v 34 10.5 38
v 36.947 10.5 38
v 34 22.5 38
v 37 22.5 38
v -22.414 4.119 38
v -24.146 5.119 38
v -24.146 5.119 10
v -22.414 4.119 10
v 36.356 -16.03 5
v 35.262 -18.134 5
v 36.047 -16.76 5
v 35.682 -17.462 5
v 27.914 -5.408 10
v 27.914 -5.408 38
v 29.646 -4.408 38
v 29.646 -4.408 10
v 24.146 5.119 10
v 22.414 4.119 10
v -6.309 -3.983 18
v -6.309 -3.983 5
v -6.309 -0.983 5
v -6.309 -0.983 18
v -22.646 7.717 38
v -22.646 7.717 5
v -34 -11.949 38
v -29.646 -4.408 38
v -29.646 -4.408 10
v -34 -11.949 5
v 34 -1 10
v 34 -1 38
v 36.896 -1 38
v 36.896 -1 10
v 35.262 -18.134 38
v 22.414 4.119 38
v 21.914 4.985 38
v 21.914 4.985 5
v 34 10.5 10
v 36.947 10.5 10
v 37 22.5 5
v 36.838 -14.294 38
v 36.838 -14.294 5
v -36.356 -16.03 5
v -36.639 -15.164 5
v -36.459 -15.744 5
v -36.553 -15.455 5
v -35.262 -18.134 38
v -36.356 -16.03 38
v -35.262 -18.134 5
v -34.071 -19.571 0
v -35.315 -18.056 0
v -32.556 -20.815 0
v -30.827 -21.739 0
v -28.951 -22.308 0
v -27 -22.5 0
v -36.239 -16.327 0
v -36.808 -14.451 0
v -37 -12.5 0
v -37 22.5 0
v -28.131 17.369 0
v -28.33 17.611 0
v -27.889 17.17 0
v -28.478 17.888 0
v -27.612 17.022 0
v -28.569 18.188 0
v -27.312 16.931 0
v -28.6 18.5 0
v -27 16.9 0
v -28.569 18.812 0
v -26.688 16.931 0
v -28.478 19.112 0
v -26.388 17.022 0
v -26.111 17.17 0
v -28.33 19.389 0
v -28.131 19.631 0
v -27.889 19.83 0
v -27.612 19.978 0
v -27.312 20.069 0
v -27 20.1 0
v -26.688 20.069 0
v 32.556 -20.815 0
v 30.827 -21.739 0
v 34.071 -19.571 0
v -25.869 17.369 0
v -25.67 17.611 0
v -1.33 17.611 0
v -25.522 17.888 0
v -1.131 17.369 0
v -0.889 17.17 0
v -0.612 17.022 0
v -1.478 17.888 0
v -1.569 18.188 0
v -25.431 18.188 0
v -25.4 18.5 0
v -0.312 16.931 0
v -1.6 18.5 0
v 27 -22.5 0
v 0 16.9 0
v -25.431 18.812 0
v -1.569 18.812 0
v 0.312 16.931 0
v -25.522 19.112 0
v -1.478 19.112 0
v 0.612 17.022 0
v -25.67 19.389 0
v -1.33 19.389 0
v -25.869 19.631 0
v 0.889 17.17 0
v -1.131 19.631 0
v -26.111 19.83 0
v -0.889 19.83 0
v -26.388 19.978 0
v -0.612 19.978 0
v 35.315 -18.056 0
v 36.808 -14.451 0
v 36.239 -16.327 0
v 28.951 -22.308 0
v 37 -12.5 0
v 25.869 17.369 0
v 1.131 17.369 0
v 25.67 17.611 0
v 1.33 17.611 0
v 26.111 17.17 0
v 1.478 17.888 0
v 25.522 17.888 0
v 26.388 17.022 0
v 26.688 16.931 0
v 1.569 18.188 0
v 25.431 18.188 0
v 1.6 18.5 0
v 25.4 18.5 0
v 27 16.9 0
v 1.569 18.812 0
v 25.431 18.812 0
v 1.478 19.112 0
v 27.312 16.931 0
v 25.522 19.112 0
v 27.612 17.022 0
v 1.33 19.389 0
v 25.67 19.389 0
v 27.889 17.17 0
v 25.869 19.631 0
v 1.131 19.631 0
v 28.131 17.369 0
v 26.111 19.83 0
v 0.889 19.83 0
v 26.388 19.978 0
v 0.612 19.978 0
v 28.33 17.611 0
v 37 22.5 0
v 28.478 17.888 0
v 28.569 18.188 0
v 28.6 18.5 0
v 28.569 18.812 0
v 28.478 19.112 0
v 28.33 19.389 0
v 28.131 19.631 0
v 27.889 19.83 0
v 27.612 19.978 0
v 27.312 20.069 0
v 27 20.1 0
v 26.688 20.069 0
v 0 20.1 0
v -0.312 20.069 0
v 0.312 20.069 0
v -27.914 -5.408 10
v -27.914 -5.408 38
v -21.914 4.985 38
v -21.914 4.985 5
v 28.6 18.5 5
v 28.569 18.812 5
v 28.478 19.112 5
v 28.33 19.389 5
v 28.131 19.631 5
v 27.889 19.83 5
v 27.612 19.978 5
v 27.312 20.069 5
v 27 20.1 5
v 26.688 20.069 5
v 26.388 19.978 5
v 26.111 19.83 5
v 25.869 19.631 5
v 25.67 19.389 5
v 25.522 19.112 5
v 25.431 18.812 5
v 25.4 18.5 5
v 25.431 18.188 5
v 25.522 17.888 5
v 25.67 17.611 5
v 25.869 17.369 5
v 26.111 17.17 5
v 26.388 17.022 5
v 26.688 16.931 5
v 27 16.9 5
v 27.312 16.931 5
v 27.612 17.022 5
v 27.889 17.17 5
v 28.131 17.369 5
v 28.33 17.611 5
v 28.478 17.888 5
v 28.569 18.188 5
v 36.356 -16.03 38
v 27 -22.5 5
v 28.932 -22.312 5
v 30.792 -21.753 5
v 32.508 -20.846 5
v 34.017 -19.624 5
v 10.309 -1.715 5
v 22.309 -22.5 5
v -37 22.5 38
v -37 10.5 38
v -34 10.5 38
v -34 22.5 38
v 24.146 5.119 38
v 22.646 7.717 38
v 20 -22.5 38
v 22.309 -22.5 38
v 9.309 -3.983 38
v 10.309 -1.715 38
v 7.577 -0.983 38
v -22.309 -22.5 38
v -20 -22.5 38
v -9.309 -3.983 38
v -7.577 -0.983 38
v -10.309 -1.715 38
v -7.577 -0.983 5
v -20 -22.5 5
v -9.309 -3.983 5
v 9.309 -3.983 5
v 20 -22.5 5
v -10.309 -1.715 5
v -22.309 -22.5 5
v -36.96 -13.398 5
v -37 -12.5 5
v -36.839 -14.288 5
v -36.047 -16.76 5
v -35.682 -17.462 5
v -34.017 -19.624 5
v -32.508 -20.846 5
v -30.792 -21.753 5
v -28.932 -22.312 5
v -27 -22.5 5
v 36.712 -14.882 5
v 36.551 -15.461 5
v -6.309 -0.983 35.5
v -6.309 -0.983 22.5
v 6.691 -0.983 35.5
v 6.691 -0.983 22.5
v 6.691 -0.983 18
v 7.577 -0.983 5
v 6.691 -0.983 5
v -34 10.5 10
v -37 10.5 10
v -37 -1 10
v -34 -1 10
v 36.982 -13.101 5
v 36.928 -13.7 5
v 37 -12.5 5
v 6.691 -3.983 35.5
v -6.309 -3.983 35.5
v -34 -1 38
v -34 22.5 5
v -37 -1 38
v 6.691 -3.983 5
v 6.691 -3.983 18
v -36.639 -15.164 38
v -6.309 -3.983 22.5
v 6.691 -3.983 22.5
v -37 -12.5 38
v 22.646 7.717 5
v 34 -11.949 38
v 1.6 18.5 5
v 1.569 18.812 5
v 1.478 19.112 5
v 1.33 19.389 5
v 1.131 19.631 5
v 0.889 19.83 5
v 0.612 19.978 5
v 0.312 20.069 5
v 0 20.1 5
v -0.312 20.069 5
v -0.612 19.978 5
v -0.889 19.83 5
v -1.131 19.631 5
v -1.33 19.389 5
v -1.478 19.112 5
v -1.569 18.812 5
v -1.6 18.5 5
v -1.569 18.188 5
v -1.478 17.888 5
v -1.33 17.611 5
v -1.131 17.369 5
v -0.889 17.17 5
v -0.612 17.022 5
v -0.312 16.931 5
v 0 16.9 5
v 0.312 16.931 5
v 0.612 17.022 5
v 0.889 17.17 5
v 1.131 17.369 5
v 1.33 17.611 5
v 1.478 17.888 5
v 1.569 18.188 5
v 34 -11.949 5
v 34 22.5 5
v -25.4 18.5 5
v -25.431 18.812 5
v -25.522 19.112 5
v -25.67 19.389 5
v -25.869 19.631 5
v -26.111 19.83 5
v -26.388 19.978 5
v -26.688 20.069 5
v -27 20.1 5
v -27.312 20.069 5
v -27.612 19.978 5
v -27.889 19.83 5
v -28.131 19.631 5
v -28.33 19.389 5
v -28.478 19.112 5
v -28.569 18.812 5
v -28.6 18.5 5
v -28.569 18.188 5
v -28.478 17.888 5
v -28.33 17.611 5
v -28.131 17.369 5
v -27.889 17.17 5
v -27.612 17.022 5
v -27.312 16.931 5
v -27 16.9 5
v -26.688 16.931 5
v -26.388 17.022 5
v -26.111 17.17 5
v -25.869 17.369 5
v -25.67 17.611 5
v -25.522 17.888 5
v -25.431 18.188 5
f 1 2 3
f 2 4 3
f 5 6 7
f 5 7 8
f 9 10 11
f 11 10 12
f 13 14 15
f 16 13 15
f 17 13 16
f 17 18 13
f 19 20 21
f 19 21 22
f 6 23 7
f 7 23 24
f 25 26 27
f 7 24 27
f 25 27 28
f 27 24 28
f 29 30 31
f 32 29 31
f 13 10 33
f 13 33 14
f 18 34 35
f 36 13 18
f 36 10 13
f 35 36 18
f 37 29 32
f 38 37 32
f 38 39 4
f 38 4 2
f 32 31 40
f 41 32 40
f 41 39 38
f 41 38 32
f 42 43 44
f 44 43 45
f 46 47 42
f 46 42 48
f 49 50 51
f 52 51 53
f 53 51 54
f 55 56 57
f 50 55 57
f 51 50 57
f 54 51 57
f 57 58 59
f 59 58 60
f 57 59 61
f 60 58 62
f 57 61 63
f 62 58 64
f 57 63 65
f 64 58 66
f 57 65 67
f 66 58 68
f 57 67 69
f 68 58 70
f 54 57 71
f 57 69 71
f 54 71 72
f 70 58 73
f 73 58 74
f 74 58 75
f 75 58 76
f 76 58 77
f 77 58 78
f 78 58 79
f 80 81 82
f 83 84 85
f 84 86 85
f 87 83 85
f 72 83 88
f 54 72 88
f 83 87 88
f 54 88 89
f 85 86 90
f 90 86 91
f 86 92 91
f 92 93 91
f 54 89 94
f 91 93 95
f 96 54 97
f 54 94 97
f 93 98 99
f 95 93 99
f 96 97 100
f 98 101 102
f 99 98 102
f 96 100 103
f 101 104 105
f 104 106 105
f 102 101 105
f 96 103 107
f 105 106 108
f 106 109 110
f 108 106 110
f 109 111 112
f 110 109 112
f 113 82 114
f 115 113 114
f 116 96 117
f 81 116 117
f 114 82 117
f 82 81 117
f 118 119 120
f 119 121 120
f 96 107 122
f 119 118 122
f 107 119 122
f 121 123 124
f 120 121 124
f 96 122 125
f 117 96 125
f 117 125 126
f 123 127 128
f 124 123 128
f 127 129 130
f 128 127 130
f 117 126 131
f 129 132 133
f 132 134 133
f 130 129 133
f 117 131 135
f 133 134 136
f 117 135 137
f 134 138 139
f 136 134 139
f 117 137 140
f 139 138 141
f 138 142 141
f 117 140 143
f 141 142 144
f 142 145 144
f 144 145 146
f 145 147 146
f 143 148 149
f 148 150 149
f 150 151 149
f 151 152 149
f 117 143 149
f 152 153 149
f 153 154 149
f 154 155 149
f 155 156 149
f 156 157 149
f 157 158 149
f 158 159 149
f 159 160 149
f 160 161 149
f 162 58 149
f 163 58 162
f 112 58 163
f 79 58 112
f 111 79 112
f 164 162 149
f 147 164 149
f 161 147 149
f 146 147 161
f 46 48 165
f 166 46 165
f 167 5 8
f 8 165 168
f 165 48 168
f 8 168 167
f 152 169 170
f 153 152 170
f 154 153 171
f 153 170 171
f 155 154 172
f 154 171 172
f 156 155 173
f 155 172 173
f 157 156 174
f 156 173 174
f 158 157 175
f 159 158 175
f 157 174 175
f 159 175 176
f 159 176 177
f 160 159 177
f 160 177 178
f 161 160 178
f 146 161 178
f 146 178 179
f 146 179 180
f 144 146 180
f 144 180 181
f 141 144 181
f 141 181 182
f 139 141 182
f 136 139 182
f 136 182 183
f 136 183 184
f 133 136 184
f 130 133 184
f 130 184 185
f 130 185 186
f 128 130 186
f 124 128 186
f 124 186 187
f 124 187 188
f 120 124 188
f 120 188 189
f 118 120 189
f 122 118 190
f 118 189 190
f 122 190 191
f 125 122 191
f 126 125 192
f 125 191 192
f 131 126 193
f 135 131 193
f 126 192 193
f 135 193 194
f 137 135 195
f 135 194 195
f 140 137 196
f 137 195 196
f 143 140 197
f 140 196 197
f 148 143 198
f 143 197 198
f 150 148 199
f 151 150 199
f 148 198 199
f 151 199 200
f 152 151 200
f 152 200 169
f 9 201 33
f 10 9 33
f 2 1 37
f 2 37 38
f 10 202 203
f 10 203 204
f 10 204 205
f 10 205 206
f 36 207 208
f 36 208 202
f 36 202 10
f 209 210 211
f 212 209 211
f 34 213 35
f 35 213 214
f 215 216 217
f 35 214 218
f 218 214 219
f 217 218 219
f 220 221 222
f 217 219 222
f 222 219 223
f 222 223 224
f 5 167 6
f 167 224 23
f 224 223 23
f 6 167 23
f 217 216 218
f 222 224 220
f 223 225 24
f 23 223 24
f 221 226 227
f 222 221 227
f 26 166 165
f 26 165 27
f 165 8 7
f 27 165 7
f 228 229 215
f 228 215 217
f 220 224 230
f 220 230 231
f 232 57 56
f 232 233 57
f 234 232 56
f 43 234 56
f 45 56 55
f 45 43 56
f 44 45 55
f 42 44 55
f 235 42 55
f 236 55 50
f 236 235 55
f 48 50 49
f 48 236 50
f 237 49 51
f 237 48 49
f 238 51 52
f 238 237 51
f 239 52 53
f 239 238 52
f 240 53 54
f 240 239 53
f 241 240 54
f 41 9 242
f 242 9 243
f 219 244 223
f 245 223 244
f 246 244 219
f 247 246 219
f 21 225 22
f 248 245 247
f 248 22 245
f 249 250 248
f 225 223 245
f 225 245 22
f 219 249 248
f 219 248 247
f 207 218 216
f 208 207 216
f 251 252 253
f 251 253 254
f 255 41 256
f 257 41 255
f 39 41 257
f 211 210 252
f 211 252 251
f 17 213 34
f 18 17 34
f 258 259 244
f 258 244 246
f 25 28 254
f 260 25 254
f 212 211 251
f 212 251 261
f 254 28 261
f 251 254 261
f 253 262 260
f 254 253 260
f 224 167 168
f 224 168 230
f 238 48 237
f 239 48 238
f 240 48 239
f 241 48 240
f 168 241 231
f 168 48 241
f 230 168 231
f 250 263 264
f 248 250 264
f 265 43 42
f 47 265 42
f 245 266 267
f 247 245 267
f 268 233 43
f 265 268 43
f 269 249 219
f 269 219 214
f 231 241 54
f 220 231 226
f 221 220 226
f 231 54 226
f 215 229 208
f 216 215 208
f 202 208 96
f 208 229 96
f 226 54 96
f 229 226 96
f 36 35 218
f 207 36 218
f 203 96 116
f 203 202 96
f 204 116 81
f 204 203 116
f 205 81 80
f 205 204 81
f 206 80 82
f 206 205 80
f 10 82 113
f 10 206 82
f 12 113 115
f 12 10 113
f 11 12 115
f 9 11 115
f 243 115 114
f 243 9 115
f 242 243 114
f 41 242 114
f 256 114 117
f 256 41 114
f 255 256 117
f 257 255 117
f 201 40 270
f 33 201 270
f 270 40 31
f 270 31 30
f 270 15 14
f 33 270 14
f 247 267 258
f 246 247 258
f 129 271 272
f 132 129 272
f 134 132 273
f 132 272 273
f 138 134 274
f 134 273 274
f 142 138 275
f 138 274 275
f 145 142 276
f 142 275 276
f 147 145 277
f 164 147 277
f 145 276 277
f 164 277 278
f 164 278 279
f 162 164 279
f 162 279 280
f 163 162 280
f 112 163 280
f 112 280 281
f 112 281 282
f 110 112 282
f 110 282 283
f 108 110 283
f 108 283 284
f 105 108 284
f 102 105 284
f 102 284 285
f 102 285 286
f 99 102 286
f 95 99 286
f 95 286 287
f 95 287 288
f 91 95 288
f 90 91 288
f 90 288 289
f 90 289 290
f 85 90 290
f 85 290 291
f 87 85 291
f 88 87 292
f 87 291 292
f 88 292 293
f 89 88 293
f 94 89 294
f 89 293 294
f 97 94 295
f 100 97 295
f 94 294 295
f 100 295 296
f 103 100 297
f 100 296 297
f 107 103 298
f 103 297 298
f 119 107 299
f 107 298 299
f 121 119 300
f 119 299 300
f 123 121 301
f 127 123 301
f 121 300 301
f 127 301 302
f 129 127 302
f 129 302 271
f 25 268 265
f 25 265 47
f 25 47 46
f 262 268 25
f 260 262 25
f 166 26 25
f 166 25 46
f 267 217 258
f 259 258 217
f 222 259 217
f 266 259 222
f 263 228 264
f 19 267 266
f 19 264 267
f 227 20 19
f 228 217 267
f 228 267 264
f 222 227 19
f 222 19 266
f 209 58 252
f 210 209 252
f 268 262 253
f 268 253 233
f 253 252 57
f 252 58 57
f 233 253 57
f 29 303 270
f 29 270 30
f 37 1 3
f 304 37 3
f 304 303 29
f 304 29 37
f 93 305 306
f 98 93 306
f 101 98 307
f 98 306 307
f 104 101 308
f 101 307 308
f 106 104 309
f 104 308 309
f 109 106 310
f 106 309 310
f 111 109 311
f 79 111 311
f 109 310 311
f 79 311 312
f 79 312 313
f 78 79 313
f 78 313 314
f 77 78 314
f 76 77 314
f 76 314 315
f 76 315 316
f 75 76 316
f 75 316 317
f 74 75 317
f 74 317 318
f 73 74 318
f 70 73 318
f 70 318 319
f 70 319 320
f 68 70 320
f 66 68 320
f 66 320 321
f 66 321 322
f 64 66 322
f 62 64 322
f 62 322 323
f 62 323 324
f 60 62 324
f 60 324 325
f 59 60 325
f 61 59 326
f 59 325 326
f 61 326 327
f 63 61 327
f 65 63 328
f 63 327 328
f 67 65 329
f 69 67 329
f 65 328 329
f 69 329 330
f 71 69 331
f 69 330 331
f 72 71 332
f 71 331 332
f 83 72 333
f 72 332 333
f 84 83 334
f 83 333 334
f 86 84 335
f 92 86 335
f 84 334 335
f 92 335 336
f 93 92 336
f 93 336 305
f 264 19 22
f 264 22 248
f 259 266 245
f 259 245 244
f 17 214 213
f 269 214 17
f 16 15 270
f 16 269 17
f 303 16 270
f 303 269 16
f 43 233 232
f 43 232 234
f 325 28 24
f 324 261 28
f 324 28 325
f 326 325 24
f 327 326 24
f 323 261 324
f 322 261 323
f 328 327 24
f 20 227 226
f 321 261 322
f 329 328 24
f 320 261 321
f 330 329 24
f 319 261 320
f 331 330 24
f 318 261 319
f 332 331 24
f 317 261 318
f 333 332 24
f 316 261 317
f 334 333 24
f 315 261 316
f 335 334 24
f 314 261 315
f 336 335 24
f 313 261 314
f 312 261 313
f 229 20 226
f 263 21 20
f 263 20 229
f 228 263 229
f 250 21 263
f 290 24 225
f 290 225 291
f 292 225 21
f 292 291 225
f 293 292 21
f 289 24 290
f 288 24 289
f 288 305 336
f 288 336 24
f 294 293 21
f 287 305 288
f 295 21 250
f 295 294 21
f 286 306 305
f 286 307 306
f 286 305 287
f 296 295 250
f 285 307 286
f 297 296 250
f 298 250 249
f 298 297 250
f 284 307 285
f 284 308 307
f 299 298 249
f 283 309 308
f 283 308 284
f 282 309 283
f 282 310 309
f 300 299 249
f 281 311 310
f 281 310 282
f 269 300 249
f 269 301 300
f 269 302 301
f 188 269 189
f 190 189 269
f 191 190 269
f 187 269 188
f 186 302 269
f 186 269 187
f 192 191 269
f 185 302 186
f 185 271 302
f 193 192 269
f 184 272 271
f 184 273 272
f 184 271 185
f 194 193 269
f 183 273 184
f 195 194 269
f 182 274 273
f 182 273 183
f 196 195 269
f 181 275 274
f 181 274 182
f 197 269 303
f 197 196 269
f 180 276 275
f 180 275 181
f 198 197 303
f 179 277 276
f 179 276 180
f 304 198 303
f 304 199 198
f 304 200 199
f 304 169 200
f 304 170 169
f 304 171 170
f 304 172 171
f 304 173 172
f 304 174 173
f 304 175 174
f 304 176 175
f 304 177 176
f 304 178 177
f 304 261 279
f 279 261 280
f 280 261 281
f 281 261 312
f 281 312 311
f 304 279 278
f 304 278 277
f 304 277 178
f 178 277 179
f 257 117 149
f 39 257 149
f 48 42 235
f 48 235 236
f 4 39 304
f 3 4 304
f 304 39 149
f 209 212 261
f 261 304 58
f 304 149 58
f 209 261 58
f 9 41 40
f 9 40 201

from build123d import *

# Parameters (mm, degrees)
SKETCH_1_W          = 74
SKETCH_1_H          = 45
EXTRUDE_1_DEPTH     = 5
FILLET_1_R          = 10
FILLET_2_R          = 10
EXTRUDE_3_DEPTH     = 33
EXTRUDE_4_DEPTH     = 33
SKETCH_6_W          = 13
SKETCH_6_H          = 13
CUT_EXTRUDE_1_DEPTH = 60.282099079
CUT_EXTRUDE_3_DEPTH = 28
EXTRUDE_5_DEPTH     = 33
SKETCH_10_W         = 3
SKETCH_10_H         = 11.5
CUT_EXTRUDE_4_DEPTH = 28
SKETCH_11_R         = 1.6
CUT_EXTRUDE_5_DEPTH = 10


with BuildPart() as part:
    # 草图1 → 凸台-拉伸1 (new body)
    with BuildSketch(Plane.XY):
        Rectangle(SKETCH_1_W, SKETCH_1_H)
    extrude(amount=EXTRUDE_1_DEPTH)

    # 圆角1
    fillet_1_edges = [part.edges().sort_by_distance(p)[0] for p in [
        (-37, -22.5, 2.5),
    ]]
    fillet(fillet_1_edges, radius=FILLET_1_R)

    # 圆角2
    fillet_2_edges = [part.edges().sort_by_distance(p)[0] for p in [
        (37, -22.5, 2.5),
    ]]
    fillet(fillet_2_edges, radius=FILLET_2_R)

    # 草图4 → 凸台-拉伸3 (add)
    with BuildSketch(Plane.XY.offset(5)):
        Polygon((-35.261752955, -18.134131531), (-21.914141487, 4.984609691), (-10.309401077, -1.715390309), (-22.309401077, -22.5), (-20, -22.5), (-7.577350269, -0.983339502), (-22.646192295, 7.716660498), (-36.356272702, -16.029895342), align=None)
        Polygon((36.356272702, -16.029895342), (35.261752955, -18.134131531), (21.914141487, 4.984609691), (10.309401077, -1.715390309), (22.309401077, -22.5), (20, -22.5), (7.577350269, -0.983339502), (22.646192295, 7.716660498), align=None)
    extrude(amount=EXTRUDE_3_DEPTH)

    # 草图5 → 凸台-拉伸4 (add)
    with BuildSketch(Plane.XY.offset(5)):
        Polygon((-7.577350269, -0.983339502), (7.577350269, -0.983339502), (9.309401077, -3.983339502), (-9.309401077, -3.983339502), align=None)
    extrude(amount=EXTRUDE_4_DEPTH)

    # 草图6 → 切除-拉伸1 (cut, through all)
    with BuildSketch(Plane.XZ.offset(3.983339502)):
        with Locations((0.190598923, 29)):
            Rectangle(SKETCH_6_W, SKETCH_6_H)
        with Locations((0.190598923, 11.5)):
            Rectangle(SKETCH_6_W, SKETCH_6_H)
    extrude(amount=-CUT_EXTRUDE_1_DEPTH, mode=Mode.SUBTRACT)

    # 草图8 → 切除-拉伸3 (cut)
    with BuildSketch(Plane.XY.offset(38)):
        Polygon((-29.646192295, -4.407695155), (-24.146192295, 5.118584287), (-22.414141487, 4.118584287), (-27.914141487, -5.407695155), align=None)
        Polygon((27.914141487, -5.407695155), (29.646192295, -4.407695155), (24.146192295, 5.118584287), (22.414141487, 4.118584287), align=None)
    extrude(amount=-CUT_EXTRUDE_3_DEPTH, mode=Mode.SUBTRACT)

    # 草图9 → 凸台-拉伸5 (add)
    with BuildSketch(Plane.XY.offset(5)):
        Polygon((-34, 22.5), (-37, 22.5), (-37, -12.5), (-36.638694465, -15.163750927), (-36.356272702, -16.029895342), (-34, -11.948711306), align=None)
        Polygon((36.356272702, -16.029895342), (34, -11.948711306), (34, 22.5), (37, 22.5), (36.837751954, -14.294055877), align=None)
    extrude(amount=EXTRUDE_5_DEPTH)

    # 草图10 → 切除-拉伸4 (cut)
    with BuildSketch(Plane.XY.offset(38)):
        with Locations((-35.5, 4.75)):
            Rectangle(SKETCH_10_W, SKETCH_10_H)
        with Locations((35.5, 4.75)):
            Rectangle(SKETCH_10_W, SKETCH_10_H)
    extrude(amount=-CUT_EXTRUDE_4_DEPTH, mode=Mode.SUBTRACT)

    # 草图11 → 切除-拉伸5 (cut)
    with BuildSketch(Plane.XY.offset(5)):
        with Locations((-27, 18.5)):
            Circle(SKETCH_11_R)
        with Locations((0, 18.5)):
            Circle(SKETCH_11_R)
        with Locations((27, 18.5)):
            Circle(SKETCH_11_R)
    extrude(amount=-CUT_EXTRUDE_5_DEPTH, mode=Mode.SUBTRACT)


solid = part.part
